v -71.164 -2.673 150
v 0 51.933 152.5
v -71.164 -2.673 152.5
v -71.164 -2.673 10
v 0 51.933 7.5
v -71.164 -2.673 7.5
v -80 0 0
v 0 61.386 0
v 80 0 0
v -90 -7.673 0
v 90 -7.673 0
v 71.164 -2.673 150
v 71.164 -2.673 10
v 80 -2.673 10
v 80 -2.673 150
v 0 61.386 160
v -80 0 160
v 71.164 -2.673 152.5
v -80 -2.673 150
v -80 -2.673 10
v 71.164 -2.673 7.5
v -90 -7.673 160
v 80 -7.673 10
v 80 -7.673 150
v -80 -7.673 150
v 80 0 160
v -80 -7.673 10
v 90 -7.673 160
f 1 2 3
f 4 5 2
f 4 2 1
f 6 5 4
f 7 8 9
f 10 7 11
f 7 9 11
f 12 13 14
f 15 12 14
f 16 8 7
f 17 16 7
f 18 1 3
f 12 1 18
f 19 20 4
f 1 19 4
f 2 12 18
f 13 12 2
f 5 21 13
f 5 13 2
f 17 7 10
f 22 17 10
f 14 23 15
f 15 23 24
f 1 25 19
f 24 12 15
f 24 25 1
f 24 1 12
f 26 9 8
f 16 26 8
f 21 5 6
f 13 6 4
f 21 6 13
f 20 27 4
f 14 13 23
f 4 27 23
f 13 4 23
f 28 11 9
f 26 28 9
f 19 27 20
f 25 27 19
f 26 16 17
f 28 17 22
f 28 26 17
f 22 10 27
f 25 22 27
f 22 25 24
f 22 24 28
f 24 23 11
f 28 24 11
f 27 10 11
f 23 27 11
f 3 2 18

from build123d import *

# Parameters (mm, degrees)
BOSS_EXTRUDE1_DEPTH = 160
SKETCH2_W           = 160
SKETCH2_H           = 140
CUT_EXTRUDE1_DEPTH  = 5
SHELL1_START        = 7.5
SHELL1_DEPTH        = 145


# Read off the part's stored shape, not the designer's step: Shell1
with BuildPart() as part:
    # Sketch1 → Boss-Extrude1 (new body)
    with BuildSketch(Plane.XY):
        Polygon((0, 61.386159038), (-80, 0), (-90, -7.67326988), (90, -7.67326988), (80, 0), align=None)
    extrude(amount=BOSS_EXTRUDE1_DEPTH)

    # Sketch2 → Cut-Extrude1 (cut)
    with BuildSketch(Plane.XZ.offset(7.67326988)):
        with Locations((0, 80)):
            Rectangle(SKETCH2_W, SKETCH2_H)
    extrude(amount=-CUT_EXTRUDE1_DEPTH, mode=Mode.SUBTRACT)

    # Shell1 outline → Shell1 (cut)
    with BuildSketch(Plane.XY.offset(SHELL1_START)):
        Polygon((0, 51.932615933), (-71.163775898, -2.67326988), (71.163775898, -2.67326988), align=None)
    extrude(amount=SHELL1_DEPTH, mode=Mode.SUBTRACT)


solid = part.part
